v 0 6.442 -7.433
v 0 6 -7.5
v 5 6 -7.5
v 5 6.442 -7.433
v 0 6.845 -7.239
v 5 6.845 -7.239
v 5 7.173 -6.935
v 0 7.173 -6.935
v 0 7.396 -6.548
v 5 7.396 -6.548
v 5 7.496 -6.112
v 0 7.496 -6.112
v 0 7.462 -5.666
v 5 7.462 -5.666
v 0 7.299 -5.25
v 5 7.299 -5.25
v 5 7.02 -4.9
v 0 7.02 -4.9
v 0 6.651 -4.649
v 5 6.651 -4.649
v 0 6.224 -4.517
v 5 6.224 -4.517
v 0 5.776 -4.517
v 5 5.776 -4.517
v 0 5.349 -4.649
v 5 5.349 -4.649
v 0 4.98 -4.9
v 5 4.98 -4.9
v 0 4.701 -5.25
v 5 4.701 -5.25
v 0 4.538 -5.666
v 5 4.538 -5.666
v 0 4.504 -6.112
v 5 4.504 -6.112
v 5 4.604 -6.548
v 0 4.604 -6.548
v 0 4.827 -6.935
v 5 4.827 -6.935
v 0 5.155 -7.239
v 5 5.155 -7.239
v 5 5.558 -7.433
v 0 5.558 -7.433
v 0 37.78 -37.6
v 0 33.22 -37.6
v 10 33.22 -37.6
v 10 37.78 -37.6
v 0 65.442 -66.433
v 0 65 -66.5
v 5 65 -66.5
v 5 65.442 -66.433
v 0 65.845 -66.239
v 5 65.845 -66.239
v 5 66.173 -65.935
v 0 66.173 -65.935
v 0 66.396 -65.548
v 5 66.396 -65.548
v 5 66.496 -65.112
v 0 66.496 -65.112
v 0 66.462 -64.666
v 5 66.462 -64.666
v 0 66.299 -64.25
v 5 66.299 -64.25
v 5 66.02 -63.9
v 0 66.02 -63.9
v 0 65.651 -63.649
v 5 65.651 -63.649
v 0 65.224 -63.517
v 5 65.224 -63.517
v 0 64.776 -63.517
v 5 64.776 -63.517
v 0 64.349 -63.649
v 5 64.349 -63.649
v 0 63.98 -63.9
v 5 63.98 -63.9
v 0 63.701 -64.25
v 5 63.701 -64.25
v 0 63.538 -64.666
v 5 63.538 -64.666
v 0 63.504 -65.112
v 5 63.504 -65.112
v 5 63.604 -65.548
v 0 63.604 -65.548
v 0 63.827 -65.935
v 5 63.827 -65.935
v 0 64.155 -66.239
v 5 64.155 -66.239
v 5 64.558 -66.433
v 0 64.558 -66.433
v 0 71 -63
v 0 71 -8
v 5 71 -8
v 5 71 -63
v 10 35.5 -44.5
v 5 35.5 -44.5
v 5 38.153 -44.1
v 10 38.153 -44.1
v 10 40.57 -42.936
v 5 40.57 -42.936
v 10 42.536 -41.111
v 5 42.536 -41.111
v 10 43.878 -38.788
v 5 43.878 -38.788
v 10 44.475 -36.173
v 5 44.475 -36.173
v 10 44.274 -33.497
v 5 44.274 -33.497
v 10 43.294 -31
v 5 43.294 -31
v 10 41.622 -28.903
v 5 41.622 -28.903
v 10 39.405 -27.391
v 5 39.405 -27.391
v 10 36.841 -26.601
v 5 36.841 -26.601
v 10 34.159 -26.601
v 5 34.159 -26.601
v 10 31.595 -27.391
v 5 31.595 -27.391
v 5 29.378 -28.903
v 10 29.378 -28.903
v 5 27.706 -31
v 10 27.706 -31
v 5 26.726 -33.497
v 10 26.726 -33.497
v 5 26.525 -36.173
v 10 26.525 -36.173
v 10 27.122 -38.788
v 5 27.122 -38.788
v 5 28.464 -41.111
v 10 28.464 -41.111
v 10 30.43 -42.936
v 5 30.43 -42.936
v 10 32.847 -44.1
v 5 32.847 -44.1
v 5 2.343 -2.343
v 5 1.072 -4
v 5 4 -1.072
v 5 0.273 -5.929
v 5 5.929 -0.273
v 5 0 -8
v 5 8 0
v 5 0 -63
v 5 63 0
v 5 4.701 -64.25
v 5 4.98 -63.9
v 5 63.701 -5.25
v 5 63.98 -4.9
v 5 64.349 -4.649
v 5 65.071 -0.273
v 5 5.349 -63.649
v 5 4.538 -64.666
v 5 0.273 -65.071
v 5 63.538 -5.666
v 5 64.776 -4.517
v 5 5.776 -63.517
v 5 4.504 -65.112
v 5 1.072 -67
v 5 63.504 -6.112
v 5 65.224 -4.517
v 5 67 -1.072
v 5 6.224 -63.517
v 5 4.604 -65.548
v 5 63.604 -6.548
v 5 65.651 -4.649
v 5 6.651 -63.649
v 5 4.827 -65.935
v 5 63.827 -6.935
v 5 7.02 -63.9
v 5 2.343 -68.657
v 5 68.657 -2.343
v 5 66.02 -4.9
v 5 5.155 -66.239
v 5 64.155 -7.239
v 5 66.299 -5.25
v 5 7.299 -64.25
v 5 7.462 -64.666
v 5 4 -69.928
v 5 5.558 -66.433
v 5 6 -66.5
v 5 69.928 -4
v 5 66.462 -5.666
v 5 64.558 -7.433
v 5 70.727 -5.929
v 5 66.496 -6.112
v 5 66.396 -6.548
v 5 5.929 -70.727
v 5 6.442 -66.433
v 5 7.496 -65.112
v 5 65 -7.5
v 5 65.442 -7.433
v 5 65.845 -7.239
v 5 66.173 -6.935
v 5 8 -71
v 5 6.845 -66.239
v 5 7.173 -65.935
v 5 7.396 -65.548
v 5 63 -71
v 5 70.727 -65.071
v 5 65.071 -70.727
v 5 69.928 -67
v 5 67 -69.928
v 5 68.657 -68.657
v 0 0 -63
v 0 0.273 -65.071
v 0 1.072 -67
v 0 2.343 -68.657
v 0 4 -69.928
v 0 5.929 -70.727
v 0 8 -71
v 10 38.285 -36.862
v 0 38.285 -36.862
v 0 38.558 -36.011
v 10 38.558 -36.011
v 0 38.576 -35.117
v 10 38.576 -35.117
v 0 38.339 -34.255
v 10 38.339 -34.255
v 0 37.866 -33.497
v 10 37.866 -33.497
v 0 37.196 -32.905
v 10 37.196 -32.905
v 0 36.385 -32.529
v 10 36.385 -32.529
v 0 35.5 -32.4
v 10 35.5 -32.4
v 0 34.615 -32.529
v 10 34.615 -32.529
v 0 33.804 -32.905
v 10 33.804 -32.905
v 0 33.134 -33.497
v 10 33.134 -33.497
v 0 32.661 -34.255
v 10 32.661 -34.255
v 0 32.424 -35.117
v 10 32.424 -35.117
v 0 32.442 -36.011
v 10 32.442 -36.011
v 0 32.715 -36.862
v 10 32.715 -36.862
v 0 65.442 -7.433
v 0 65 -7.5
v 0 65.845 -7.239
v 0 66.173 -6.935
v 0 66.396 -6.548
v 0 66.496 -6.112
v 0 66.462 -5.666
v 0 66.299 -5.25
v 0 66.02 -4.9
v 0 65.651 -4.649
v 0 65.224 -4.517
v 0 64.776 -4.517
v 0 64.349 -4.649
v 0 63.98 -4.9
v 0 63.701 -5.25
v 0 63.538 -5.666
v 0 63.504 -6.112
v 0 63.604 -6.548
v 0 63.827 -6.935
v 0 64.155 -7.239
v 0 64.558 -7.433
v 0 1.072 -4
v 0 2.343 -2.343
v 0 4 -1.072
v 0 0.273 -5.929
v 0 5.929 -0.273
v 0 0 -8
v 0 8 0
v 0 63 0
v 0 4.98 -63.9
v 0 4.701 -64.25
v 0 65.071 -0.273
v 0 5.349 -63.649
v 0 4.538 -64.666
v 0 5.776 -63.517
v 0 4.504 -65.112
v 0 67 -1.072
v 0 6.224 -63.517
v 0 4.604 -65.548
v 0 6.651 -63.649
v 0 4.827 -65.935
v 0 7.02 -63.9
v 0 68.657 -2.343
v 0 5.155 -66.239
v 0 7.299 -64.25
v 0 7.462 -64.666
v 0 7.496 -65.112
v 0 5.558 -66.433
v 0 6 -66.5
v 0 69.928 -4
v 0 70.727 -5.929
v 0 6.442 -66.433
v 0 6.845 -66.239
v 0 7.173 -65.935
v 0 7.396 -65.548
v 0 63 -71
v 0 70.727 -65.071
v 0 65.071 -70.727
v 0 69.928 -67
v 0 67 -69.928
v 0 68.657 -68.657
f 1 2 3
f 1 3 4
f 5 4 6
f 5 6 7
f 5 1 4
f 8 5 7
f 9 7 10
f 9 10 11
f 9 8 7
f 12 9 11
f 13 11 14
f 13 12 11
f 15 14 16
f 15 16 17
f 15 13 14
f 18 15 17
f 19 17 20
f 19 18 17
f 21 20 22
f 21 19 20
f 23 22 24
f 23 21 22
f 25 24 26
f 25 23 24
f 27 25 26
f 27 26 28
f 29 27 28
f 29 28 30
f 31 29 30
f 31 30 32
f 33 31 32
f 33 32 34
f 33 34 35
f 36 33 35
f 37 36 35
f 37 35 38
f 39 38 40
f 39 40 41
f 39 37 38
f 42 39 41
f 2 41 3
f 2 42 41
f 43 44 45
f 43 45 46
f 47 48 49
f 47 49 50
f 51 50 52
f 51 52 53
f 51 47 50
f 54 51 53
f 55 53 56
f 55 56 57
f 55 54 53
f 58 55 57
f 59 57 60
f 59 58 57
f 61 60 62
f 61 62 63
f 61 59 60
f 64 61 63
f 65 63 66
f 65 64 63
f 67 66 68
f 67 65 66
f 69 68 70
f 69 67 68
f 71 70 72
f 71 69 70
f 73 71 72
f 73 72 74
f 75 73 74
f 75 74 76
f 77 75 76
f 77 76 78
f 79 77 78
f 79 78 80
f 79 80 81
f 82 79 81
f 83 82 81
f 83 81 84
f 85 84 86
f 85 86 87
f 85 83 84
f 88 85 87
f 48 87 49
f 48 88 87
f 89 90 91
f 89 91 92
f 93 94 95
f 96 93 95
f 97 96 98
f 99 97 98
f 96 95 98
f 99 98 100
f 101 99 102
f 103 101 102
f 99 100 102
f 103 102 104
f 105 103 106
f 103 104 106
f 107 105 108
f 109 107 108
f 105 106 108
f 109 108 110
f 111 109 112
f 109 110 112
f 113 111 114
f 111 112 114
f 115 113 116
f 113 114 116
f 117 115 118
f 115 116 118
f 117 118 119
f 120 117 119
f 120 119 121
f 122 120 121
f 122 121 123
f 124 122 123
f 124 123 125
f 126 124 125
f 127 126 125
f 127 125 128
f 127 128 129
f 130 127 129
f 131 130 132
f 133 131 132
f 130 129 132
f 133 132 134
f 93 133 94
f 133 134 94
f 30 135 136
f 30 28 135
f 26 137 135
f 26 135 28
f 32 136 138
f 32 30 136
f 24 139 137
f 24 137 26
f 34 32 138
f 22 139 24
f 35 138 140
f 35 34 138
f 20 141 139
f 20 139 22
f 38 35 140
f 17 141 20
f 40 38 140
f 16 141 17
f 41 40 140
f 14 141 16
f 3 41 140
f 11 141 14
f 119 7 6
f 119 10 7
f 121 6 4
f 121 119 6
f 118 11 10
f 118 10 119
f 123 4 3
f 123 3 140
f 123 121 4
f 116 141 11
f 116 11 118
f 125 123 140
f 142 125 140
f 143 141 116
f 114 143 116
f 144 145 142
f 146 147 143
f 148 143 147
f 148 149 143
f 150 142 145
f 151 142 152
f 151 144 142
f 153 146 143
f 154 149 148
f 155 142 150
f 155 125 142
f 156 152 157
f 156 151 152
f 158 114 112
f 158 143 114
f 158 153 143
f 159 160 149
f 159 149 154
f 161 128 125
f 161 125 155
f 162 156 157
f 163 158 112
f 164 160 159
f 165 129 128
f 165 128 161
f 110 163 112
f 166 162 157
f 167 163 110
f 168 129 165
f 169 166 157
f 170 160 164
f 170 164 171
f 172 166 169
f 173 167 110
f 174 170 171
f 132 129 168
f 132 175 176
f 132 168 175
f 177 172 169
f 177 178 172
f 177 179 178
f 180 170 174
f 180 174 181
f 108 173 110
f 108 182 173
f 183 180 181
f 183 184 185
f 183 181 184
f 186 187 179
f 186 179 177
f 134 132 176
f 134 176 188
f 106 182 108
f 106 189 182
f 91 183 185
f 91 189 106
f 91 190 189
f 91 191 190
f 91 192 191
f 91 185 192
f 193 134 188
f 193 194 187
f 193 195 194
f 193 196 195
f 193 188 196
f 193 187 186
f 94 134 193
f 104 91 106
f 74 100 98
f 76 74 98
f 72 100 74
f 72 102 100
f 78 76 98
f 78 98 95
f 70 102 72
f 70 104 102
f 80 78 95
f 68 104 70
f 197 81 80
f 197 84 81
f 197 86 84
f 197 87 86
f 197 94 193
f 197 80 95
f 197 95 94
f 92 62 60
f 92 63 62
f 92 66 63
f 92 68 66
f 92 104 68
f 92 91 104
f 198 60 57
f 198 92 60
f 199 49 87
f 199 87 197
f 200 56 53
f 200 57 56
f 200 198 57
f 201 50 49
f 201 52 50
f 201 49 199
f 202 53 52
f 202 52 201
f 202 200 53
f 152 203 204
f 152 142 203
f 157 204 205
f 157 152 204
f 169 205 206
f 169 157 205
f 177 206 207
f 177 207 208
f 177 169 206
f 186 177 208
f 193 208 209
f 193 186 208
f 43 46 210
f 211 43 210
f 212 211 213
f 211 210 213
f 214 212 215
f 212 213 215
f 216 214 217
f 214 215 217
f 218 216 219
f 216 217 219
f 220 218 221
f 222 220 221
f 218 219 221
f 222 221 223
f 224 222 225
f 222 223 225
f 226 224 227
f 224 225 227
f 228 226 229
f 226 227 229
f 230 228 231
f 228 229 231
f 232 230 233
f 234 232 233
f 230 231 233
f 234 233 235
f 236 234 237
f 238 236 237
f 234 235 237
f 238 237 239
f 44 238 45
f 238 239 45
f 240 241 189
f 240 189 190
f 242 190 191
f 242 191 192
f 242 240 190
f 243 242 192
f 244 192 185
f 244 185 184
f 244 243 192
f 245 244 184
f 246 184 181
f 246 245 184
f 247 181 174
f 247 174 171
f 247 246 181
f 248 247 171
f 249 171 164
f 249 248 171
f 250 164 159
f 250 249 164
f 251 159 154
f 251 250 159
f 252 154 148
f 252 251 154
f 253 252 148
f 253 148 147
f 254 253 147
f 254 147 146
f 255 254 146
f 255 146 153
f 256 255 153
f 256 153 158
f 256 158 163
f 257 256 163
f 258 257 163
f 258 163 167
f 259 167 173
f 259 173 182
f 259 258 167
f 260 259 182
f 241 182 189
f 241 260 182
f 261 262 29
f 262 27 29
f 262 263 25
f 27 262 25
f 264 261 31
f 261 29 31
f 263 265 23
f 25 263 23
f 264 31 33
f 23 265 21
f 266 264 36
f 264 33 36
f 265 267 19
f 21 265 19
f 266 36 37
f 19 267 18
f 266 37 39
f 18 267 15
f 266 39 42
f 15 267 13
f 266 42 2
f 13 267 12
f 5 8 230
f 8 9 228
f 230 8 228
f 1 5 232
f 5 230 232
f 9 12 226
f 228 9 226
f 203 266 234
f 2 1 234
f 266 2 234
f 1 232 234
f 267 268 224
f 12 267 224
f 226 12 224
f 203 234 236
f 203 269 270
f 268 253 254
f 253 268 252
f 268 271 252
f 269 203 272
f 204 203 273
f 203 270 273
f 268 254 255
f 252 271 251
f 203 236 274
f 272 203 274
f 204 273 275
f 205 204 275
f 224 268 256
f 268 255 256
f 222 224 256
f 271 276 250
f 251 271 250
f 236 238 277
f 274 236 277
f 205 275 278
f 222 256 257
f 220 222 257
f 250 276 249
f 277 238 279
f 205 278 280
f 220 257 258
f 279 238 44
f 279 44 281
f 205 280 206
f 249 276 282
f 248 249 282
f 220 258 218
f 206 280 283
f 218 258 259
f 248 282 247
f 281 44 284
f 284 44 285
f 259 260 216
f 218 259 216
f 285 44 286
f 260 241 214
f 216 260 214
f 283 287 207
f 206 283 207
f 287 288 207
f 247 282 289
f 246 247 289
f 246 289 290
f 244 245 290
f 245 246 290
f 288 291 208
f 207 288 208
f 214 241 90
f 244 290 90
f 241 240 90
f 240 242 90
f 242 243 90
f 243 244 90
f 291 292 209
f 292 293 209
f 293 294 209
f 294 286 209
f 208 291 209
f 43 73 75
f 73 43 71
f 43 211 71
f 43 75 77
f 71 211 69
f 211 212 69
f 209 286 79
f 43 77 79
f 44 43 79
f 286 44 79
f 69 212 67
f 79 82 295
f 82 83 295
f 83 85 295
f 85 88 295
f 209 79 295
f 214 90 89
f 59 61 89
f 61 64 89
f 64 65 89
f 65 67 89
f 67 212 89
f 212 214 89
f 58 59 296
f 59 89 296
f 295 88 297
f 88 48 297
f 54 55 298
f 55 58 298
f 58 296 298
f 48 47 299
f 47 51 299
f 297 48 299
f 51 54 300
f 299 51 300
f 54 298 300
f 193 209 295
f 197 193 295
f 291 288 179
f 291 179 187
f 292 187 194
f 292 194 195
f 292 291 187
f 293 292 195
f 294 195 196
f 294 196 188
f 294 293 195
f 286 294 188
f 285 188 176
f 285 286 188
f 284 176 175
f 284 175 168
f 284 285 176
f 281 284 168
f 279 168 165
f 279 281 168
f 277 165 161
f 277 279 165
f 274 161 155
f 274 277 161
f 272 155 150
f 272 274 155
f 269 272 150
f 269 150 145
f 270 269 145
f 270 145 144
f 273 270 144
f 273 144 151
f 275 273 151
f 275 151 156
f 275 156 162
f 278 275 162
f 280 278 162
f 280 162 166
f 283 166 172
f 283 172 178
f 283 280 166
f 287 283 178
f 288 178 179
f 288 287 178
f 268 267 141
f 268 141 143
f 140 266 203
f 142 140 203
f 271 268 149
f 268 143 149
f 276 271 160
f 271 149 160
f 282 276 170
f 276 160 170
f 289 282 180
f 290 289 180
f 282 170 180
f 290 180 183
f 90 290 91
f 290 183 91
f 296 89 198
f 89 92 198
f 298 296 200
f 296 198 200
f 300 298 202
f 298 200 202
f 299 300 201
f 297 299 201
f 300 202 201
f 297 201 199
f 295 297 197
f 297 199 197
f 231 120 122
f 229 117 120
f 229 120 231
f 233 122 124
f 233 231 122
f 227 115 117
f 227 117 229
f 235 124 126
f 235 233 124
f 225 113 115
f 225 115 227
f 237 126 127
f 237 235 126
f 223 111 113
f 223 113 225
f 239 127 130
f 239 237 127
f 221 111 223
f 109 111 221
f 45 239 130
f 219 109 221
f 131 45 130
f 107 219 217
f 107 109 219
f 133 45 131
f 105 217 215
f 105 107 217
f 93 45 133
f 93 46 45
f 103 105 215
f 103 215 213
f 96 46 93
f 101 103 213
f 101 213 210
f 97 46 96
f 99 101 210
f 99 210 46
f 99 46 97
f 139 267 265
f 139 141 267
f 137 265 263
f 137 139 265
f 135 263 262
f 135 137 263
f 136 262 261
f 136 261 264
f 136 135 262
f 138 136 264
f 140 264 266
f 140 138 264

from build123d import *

# Parameters (mm, degrees)
SKETCH1_W           = 71
SKETCH1_H           = 71
SKETCH1_R           = 1.5
BOSS_EXTRUDE1_DEPTH = 5
FILLET1_R           = 8
SKETCH2_R           = 9
BOSS_EXTRUDE2_DEPTH = 5
CUT_EXTRUDE1_DEPTH  = 11


with BuildPart() as part:
    # Sketch1 → Boss-Extrude1 (new body)
    with BuildSketch(Plane(origin=(0, 0, 0), x_dir=(0, 0, -1), z_dir=(1, 0, 0))):
        with Locations((35.5, 35.5)):
            Rectangle(SKETCH1_W, SKETCH1_H)
        with Locations((6, 6)):
            Circle(SKETCH1_R, mode=Mode.SUBTRACT)
        with Locations((6, 65)):
            Circle(SKETCH1_R, mode=Mode.SUBTRACT)
        with Locations((65, 65)):
            Circle(SKETCH1_R, mode=Mode.SUBTRACT)
        with Locations((65, 6)):
            Circle(SKETCH1_R, mode=Mode.SUBTRACT)
    extrude(amount=BOSS_EXTRUDE1_DEPTH)

    # Fillet1
    fillet1_edges = [part.edges().sort_by_distance(p)[0] for p in [
        (2.5, 71, 0),
        (2.5, 71, -71),
        (2.5, 0, -71),
        (2.5, 0, 0),
    ]]
    fillet(fillet1_edges, radius=FILLET1_R)

    # Sketch2 → Boss-Extrude2 (add)
    with BuildSketch(Plane(origin=(5, 0, 0), x_dir=(0, 0, -1), z_dir=(1, 0, 0))):
        with Locations((35.5, 35.5)):
            Circle(SKETCH2_R)
    extrude(amount=BOSS_EXTRUDE2_DEPTH)

    # Sketch3 → Cut-Extrude1 (cut, through all)
    with BuildSketch(Plane(origin=(10, 0, 0), x_dir=(0, 0, -1), z_dir=(1, 0, 0))):
        with BuildLine():
            Line((37.6, 33.21964915), (37.6, 37.78035085))
            ThreePointArc((37.6, 37.78035085), (32.4, 35.5), (37.6, 33.21964915))
        make_face()
    extrude(amount=-CUT_EXTRUDE1_DEPTH, mode=Mode.SUBTRACT)


solid = part.part
